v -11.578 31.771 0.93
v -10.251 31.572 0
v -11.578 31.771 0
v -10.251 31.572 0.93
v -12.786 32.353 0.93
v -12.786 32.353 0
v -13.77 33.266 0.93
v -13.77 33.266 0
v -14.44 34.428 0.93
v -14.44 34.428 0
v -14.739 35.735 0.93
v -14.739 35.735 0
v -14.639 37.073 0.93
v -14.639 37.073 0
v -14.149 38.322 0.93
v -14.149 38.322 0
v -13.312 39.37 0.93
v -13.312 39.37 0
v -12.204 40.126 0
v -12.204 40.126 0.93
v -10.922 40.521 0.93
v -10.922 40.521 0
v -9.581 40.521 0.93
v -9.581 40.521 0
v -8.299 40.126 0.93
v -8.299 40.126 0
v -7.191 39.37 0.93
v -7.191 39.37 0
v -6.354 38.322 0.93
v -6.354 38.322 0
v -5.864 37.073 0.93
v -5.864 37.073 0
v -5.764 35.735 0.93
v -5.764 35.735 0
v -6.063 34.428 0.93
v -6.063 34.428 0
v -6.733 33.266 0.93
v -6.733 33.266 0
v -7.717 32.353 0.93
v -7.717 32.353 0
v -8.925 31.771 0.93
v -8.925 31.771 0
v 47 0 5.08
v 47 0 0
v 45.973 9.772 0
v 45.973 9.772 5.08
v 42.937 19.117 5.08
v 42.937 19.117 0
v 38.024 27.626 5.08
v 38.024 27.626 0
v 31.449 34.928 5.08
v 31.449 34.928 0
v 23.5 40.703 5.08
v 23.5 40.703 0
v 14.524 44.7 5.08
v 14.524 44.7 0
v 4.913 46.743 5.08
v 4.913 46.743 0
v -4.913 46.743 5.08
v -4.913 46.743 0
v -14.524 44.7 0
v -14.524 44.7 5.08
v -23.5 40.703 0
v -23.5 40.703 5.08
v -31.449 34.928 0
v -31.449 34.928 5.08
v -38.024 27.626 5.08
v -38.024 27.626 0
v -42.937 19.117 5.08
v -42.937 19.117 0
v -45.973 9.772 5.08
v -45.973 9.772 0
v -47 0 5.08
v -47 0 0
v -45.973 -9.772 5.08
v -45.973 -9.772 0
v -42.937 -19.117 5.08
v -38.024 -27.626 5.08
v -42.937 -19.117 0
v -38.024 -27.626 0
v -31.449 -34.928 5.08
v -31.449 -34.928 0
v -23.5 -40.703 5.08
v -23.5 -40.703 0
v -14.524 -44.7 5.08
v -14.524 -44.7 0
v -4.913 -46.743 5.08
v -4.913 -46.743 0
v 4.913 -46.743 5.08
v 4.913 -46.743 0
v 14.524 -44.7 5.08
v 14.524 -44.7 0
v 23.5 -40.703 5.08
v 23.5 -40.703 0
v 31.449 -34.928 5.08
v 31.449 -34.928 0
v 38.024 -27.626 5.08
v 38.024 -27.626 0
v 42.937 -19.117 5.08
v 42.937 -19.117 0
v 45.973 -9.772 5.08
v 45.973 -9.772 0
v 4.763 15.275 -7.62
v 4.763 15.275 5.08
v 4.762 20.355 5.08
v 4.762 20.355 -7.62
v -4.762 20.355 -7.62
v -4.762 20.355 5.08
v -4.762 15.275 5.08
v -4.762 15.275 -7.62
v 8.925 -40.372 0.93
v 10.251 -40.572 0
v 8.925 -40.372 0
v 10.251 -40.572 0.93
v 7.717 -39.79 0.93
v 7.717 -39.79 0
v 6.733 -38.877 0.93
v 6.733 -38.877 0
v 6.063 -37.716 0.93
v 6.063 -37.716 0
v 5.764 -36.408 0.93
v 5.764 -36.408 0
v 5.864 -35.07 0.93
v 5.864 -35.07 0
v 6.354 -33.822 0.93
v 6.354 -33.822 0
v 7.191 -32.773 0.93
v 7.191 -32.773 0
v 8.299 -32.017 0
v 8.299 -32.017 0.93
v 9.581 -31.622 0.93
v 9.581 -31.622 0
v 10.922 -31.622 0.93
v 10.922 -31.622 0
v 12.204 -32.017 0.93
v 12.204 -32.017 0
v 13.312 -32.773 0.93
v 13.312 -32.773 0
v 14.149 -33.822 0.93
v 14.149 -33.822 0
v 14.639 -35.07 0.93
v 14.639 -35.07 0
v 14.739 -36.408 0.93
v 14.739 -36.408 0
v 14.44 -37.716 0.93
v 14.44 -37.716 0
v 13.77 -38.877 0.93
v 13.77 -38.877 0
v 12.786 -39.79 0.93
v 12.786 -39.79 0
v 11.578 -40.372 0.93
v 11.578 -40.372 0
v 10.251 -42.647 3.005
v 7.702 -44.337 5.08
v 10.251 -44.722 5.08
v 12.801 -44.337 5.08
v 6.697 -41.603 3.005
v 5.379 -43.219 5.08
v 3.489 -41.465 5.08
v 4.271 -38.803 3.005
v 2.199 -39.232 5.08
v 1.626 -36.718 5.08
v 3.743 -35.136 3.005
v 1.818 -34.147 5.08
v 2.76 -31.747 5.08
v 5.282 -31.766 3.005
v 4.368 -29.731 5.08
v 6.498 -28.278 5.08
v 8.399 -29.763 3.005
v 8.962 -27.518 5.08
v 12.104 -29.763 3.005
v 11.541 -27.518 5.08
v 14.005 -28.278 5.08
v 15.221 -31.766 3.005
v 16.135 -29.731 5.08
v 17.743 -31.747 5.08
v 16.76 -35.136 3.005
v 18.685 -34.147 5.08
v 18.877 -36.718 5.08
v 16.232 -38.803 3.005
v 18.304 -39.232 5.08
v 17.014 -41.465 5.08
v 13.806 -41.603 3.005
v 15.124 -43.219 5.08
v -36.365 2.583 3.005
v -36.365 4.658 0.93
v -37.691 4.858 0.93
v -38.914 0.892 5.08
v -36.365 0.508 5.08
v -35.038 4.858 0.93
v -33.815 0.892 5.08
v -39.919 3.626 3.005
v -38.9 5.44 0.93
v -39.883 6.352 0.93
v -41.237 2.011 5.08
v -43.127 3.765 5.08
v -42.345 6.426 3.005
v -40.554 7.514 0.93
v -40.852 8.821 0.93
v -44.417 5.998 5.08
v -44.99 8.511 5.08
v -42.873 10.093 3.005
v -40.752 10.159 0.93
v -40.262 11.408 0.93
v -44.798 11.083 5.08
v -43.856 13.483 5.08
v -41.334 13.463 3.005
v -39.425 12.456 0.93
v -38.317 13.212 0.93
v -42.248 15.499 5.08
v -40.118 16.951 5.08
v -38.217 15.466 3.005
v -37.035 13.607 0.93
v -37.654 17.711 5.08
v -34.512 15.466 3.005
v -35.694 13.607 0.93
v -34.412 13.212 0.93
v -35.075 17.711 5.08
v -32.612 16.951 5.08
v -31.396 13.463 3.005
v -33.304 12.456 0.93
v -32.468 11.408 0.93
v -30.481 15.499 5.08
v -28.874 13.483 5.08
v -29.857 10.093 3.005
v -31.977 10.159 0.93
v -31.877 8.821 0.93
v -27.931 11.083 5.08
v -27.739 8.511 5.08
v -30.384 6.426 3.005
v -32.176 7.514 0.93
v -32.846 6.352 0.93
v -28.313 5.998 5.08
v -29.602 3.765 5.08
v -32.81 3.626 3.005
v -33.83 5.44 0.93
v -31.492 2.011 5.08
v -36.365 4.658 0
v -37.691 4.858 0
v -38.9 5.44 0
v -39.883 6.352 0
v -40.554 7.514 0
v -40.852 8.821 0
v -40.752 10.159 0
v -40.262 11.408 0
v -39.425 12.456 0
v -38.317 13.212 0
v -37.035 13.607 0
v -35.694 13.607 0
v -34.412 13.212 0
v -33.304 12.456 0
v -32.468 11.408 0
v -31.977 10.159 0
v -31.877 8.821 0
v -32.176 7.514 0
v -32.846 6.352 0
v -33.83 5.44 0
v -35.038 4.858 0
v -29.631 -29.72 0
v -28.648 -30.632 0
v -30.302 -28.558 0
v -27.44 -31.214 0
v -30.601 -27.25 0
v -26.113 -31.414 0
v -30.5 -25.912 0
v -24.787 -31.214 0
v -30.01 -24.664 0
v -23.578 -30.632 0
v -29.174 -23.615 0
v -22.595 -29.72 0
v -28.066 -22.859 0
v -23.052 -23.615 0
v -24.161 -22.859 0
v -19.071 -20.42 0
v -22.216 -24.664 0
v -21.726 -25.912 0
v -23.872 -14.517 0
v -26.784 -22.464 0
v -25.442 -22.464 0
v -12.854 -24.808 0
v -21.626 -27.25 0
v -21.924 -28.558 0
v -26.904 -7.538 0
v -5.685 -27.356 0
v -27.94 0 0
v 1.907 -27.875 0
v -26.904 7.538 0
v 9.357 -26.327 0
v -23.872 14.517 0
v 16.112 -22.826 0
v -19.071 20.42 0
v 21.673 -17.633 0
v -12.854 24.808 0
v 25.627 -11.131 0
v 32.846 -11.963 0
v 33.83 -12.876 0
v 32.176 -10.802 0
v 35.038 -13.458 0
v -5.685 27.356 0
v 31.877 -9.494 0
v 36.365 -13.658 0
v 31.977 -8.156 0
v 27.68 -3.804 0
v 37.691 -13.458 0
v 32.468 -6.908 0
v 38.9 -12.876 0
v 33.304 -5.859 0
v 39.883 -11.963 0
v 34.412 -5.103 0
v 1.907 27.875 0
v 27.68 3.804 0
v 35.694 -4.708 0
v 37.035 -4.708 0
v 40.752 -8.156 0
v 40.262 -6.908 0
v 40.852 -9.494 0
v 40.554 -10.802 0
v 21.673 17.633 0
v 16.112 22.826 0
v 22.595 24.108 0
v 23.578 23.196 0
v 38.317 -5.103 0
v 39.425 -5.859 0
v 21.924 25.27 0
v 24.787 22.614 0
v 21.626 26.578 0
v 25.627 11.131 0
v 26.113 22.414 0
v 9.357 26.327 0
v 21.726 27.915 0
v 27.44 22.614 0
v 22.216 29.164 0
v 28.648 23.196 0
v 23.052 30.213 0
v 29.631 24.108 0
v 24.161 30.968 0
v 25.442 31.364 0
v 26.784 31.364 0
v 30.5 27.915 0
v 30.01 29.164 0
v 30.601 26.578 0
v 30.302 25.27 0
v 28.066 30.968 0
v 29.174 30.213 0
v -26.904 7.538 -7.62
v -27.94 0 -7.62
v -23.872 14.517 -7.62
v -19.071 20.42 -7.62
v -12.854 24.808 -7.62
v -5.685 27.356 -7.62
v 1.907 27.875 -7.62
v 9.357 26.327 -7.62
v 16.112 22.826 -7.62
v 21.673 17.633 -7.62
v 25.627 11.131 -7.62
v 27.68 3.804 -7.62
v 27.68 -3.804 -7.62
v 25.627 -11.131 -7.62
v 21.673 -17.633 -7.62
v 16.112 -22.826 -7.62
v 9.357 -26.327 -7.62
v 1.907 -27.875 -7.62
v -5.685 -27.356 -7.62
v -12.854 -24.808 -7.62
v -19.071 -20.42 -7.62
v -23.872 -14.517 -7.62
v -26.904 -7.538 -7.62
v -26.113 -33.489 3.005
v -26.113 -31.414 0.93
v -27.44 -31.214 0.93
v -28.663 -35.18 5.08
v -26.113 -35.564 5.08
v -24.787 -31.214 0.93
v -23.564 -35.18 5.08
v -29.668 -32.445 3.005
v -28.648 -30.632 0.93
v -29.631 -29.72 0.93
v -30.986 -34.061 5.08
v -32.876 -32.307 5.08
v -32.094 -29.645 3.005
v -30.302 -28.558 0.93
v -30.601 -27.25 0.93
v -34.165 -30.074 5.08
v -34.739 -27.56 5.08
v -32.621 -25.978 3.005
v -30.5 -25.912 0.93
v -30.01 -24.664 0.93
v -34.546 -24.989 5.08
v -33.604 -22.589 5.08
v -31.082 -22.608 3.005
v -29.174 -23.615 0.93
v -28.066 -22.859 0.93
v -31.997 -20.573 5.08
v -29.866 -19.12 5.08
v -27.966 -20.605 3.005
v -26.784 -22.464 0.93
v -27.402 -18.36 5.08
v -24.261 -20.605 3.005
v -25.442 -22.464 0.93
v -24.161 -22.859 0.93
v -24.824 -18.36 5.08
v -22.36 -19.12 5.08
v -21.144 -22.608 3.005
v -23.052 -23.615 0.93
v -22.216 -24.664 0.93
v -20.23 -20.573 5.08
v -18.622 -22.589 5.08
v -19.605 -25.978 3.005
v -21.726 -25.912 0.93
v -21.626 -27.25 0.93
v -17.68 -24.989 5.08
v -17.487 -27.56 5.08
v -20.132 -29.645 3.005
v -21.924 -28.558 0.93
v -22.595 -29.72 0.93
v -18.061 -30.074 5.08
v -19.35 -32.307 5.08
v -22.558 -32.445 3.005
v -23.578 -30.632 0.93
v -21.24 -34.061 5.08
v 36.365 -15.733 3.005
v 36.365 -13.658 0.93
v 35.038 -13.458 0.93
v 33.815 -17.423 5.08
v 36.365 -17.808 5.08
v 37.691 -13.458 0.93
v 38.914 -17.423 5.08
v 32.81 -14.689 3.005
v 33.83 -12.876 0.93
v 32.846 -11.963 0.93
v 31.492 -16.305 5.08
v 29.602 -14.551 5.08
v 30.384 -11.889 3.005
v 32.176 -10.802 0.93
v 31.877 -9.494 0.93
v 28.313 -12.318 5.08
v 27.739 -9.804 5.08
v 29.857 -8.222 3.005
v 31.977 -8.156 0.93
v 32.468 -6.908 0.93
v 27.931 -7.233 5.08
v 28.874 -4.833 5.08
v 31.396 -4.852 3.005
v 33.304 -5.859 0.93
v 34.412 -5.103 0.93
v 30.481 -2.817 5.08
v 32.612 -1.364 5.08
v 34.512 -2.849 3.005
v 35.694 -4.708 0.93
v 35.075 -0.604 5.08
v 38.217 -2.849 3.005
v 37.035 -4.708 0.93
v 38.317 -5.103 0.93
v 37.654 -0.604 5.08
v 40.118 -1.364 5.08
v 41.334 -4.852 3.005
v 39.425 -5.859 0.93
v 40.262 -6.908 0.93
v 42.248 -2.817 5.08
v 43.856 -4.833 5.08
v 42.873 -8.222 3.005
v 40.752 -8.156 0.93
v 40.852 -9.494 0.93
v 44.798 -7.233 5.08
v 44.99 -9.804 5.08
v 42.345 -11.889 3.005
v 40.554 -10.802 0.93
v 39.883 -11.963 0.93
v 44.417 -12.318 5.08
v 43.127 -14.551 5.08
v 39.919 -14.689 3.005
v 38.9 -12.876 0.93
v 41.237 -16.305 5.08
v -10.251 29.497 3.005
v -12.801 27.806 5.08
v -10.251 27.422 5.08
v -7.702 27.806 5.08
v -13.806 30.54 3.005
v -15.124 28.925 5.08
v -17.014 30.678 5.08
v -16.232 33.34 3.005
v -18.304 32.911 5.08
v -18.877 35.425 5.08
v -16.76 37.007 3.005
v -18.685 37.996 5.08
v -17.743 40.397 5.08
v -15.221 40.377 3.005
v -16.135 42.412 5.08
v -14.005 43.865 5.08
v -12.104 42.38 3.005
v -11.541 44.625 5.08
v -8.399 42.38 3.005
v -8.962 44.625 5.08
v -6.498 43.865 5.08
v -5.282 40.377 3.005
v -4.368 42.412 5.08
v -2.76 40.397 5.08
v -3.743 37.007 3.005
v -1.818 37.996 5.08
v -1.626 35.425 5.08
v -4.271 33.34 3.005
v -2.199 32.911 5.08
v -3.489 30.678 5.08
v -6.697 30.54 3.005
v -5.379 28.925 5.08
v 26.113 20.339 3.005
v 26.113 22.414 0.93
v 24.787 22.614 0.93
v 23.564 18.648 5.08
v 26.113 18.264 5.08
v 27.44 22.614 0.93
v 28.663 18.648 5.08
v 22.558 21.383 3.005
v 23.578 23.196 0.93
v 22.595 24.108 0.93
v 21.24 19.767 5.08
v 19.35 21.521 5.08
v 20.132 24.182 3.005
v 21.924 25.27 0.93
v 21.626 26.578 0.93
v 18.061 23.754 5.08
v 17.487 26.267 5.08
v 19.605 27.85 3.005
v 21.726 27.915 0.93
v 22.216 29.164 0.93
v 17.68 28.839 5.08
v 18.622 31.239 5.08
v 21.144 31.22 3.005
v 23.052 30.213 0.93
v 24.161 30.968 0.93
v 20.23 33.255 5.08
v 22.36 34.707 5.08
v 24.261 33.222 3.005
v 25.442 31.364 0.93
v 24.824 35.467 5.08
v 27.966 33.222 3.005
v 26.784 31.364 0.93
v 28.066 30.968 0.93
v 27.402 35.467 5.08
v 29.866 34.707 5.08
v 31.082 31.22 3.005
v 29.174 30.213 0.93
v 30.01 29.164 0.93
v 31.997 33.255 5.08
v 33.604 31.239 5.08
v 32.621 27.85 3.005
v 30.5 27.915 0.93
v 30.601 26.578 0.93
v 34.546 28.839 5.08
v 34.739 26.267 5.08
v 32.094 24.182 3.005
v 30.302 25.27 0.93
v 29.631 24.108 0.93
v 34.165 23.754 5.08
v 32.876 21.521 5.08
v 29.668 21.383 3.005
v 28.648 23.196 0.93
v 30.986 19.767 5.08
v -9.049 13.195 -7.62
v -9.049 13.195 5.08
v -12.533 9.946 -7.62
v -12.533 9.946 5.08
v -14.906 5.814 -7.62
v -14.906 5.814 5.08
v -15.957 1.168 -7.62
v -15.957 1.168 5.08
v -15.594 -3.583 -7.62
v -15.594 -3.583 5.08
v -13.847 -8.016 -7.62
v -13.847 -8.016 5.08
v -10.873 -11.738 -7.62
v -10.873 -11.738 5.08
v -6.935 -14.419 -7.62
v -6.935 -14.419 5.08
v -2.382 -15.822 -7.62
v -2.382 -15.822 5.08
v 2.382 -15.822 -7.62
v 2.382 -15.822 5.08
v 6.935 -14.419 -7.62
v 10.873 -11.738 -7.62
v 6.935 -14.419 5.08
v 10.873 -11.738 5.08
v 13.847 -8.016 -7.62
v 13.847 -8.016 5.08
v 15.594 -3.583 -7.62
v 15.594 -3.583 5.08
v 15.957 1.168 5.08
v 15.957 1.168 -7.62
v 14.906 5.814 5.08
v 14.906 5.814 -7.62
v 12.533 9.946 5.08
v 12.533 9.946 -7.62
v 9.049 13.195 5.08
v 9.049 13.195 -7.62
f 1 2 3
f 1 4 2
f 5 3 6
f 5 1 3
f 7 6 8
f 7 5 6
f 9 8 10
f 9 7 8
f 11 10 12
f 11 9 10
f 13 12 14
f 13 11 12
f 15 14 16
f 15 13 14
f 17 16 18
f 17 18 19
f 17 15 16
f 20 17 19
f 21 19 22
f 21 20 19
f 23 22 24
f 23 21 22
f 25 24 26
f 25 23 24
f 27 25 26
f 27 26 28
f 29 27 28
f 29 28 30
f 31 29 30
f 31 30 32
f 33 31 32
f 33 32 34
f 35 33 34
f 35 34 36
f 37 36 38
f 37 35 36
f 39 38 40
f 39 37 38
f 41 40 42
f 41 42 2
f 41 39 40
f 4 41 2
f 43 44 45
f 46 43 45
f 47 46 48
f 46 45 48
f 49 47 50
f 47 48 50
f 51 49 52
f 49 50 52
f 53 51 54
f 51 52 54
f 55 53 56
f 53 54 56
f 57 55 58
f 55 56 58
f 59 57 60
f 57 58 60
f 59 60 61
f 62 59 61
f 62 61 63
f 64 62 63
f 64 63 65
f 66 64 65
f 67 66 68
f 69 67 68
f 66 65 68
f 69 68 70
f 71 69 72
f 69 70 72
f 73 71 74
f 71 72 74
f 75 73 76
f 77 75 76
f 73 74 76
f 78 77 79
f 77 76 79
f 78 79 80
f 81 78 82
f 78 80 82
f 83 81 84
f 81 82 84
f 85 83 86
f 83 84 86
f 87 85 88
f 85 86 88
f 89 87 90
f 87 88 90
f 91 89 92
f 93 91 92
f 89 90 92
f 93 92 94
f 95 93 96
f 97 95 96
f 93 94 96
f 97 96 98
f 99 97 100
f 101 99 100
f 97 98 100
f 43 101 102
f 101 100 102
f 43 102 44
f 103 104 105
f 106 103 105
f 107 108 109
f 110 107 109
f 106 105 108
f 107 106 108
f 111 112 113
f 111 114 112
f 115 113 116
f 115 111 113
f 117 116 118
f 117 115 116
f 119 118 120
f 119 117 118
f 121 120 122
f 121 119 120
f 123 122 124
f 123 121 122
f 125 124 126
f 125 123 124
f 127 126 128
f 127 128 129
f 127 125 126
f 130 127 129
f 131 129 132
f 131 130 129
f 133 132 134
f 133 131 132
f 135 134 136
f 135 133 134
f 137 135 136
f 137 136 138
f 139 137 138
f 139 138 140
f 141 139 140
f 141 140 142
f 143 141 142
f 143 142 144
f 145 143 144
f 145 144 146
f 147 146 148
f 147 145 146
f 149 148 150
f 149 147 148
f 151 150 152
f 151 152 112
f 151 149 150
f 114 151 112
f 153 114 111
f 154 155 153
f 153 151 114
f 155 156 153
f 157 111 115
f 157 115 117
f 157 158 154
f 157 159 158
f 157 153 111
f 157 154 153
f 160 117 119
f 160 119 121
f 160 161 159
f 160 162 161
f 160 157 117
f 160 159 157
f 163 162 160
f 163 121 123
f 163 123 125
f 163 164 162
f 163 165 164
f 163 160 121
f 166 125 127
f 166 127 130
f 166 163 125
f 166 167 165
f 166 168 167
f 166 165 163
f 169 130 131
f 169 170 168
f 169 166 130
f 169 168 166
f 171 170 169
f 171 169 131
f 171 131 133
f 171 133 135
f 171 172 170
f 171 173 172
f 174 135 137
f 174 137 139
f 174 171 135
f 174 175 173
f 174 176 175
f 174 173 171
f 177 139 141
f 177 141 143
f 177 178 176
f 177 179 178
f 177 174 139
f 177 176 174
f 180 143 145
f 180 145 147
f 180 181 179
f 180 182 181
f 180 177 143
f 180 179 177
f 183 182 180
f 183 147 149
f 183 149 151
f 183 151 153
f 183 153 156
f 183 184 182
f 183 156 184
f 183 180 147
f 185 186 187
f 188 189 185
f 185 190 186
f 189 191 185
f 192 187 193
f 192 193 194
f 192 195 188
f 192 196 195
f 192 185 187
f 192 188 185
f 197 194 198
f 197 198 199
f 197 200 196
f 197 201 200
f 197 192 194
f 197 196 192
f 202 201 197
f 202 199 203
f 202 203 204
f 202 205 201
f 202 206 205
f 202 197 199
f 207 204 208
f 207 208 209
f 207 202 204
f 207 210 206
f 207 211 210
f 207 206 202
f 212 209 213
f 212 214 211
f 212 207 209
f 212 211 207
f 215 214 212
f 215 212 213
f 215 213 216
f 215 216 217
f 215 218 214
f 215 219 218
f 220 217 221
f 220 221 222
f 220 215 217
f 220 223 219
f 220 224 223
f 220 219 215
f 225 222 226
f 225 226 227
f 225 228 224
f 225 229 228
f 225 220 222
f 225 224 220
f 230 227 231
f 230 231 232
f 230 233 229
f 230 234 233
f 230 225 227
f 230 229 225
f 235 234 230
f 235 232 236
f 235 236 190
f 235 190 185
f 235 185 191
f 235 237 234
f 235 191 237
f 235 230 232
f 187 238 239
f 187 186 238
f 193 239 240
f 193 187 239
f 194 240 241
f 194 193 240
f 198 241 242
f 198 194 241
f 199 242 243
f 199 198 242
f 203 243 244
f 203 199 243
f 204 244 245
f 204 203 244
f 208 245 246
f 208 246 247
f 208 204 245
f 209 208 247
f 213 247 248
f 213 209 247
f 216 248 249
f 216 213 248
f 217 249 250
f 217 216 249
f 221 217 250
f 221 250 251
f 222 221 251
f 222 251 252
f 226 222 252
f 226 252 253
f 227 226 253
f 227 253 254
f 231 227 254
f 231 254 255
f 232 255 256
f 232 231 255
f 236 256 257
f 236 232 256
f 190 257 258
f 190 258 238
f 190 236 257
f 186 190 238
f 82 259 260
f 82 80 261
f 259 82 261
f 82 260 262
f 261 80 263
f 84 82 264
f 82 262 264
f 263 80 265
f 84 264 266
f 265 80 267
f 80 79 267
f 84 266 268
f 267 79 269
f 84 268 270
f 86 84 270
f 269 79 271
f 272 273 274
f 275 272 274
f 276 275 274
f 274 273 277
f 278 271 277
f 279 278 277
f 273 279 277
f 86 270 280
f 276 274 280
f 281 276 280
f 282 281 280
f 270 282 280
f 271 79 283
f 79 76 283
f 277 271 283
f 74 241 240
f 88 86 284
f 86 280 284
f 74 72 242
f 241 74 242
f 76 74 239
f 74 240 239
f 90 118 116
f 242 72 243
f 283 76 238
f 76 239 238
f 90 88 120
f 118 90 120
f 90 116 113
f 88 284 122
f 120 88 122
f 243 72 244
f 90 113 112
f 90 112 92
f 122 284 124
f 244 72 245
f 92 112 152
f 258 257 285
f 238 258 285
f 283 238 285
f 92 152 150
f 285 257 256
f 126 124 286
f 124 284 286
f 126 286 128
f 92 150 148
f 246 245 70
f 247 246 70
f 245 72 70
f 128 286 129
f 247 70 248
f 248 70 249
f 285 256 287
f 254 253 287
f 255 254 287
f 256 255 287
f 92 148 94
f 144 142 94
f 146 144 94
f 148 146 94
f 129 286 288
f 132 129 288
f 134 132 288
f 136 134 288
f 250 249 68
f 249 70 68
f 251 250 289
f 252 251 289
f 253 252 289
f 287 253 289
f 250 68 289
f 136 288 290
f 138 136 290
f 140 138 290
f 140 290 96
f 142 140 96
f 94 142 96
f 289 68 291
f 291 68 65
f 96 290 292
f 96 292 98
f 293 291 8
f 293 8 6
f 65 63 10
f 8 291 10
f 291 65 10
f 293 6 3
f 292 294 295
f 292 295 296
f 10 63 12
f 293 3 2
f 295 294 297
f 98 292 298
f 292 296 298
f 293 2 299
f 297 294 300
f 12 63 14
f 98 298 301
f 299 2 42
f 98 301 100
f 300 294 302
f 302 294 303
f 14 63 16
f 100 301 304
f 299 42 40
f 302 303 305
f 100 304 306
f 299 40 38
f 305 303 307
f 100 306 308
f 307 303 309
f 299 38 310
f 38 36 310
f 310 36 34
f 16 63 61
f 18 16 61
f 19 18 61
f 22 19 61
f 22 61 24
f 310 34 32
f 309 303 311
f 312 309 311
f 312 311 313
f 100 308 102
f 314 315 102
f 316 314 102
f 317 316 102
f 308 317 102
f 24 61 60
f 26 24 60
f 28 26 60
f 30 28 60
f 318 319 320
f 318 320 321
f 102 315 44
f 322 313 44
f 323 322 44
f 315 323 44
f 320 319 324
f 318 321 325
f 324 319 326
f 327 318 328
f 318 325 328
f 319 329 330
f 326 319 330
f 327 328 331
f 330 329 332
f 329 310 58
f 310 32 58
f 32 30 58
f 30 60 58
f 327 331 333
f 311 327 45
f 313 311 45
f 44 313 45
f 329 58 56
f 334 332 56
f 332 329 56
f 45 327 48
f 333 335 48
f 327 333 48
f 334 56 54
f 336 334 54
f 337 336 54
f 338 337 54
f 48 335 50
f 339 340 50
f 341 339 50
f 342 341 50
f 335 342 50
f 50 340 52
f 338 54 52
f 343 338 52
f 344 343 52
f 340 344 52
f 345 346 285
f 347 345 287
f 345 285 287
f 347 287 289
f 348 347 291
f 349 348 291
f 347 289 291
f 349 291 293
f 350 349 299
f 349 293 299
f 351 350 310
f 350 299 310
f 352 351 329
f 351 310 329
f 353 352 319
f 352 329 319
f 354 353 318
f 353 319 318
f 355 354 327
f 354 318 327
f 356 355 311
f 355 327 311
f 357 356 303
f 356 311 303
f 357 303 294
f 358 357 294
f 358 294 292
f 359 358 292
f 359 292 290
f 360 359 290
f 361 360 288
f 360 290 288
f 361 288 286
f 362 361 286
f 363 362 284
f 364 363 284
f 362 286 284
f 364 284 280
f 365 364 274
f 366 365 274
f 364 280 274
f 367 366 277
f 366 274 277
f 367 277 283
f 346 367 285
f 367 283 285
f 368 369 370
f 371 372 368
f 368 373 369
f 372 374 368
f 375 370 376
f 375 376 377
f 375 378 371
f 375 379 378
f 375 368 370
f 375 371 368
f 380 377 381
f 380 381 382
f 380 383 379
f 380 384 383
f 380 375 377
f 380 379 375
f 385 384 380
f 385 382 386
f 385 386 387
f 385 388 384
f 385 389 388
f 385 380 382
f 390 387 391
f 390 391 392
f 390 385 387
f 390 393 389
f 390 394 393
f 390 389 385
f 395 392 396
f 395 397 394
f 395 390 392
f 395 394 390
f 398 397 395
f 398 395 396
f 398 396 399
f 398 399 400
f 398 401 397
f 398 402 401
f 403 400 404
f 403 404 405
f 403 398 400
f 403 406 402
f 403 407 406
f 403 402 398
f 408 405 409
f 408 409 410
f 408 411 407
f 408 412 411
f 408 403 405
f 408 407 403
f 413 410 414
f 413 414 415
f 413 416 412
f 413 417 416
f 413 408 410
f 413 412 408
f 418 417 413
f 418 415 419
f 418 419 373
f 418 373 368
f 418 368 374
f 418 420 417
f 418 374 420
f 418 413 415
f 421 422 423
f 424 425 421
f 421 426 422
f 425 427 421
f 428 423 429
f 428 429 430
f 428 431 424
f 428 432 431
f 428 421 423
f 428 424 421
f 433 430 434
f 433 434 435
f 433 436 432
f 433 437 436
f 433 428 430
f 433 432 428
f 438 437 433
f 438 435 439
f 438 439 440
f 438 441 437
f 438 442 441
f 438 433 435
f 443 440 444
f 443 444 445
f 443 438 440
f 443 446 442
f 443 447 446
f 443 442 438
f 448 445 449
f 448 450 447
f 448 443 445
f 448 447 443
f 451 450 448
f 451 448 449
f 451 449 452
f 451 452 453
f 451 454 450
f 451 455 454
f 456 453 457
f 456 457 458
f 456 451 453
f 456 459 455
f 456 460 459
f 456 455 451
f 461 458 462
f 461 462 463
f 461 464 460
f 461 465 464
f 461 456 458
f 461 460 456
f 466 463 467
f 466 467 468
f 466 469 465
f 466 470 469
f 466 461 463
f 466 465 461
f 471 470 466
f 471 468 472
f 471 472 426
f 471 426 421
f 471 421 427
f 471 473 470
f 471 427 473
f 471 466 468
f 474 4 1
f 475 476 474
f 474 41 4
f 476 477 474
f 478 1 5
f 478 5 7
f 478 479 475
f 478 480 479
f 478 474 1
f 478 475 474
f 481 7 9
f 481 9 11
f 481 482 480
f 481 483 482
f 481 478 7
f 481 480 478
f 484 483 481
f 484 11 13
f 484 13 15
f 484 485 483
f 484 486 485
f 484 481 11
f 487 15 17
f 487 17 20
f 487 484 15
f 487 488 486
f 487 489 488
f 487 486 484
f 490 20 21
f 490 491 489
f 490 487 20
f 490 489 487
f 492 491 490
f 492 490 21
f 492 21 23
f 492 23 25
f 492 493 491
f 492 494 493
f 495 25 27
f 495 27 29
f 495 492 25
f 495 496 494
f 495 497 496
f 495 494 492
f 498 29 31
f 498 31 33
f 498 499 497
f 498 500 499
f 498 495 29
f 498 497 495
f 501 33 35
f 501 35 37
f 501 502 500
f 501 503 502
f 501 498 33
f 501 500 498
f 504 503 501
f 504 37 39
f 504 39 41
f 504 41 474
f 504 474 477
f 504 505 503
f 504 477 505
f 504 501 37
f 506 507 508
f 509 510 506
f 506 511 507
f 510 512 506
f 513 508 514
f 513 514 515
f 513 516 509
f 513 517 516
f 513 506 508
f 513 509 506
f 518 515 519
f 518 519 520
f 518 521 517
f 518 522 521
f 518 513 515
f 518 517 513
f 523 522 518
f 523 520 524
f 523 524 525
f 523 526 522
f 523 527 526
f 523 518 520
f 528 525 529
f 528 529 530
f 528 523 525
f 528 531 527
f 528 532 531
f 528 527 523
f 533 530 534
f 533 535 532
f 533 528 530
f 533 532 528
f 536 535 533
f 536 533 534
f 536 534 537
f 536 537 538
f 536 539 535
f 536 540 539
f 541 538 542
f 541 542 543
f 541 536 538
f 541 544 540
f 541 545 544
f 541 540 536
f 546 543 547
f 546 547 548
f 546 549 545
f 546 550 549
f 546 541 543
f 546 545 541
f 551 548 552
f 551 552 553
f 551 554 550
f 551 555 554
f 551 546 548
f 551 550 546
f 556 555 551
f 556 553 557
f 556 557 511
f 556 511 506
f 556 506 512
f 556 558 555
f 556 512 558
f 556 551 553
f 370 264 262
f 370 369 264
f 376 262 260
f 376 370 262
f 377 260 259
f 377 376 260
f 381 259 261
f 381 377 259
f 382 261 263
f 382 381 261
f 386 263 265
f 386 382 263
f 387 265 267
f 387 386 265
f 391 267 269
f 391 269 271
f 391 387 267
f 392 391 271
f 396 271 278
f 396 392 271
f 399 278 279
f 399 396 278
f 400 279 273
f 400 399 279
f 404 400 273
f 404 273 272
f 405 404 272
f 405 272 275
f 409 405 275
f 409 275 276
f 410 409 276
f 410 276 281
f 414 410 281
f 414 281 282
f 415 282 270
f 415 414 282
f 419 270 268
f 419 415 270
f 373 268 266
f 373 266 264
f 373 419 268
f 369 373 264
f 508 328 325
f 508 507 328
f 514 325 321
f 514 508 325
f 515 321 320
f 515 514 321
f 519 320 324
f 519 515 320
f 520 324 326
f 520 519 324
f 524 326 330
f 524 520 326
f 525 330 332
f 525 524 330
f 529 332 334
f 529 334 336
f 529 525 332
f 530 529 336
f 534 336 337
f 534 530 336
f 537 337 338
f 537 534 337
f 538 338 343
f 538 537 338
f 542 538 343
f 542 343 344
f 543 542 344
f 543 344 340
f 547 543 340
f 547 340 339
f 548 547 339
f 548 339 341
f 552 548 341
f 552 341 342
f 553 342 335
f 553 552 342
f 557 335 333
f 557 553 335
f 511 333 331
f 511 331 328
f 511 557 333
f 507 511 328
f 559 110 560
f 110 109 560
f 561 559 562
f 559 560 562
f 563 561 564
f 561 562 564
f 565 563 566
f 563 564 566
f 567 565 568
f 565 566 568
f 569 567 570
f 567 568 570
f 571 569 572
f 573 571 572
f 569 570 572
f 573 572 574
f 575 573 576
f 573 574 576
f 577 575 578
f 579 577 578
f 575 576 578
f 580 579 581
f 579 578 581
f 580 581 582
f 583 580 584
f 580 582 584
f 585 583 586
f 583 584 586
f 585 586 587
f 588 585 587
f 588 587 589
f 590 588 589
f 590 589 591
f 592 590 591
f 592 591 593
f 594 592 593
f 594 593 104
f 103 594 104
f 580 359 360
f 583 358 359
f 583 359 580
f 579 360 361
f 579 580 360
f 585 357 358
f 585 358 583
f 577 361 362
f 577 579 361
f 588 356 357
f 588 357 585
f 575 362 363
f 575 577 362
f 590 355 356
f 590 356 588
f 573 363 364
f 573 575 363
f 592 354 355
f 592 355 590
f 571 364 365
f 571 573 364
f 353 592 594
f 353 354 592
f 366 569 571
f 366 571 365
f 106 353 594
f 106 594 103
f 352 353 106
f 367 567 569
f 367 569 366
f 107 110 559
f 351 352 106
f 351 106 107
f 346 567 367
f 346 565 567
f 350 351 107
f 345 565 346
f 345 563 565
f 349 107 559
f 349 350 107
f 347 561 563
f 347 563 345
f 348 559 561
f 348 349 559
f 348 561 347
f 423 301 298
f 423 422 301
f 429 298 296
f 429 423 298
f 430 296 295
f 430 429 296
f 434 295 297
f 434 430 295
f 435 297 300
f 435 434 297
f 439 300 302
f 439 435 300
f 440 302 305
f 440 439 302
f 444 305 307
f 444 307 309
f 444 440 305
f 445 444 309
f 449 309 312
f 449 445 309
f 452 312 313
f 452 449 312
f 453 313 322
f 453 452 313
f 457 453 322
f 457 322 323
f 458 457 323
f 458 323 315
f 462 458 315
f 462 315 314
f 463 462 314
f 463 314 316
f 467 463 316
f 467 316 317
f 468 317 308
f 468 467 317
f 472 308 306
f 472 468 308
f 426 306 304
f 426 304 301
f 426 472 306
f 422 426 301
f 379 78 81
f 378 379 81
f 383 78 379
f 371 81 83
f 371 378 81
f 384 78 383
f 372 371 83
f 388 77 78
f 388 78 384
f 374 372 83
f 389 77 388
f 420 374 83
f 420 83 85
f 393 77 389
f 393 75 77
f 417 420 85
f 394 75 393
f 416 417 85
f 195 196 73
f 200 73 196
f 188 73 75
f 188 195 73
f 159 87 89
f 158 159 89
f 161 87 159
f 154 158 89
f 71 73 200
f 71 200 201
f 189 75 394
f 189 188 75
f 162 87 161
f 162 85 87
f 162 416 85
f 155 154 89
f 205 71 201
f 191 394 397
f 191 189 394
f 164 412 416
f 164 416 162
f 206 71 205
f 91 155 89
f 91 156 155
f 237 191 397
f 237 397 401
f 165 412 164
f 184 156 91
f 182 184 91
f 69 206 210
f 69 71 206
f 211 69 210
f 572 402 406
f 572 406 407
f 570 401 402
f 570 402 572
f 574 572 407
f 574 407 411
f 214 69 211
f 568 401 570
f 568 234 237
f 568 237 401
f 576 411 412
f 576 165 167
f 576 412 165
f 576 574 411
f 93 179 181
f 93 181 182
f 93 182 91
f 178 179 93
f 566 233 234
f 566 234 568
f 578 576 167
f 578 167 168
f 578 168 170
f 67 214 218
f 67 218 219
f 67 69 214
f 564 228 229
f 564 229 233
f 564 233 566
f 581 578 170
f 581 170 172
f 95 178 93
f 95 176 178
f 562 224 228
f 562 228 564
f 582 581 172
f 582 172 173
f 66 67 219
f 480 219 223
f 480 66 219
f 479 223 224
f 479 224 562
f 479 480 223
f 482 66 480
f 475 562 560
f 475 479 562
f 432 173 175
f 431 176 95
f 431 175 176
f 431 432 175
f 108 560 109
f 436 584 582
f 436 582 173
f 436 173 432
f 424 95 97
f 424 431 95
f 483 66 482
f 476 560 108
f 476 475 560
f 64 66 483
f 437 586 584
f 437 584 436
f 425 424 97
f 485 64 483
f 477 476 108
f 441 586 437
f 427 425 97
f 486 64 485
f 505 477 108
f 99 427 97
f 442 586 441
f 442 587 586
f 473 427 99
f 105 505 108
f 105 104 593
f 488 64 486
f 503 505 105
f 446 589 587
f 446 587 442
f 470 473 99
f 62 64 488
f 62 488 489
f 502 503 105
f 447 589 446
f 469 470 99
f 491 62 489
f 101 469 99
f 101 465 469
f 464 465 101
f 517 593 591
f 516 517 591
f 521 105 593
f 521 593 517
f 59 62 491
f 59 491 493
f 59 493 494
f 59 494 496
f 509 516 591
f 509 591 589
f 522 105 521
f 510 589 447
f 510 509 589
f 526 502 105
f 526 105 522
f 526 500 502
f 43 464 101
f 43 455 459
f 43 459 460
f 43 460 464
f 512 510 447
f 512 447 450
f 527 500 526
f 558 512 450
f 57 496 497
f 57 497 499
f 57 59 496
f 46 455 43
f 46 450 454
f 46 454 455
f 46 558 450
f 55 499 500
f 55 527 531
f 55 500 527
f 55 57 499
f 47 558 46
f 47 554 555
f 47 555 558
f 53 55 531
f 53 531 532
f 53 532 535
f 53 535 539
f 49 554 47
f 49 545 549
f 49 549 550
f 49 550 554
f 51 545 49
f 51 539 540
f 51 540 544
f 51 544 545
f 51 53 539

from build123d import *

# Parameters (mm, degrees)
SKETCH1_R                                      = 47
BOSS_EXTRUDE1_DEPTH                            = 5.08
CSK_FOR_M8_FLAT_HEAD_MACHINE_SCREW1_AT_2_COUNT = 2
CSK_FOR_M8_FLAT_HEAD_MACHINE_SCREW1_AT_2_PITCH = 37.5
CSK_FOR_M8_FLAT_HEAD_MACHINE_SCREW1_AT_3_COUNT = 2
CSK_FOR_M8_FLAT_HEAD_MACHINE_SCREW1_AT_3_PITCH = 37.5
CSK_FOR_M8_FLAT_HEAD_MACHINE_SCREW1_AT_4_COUNT = 2
CSK_FOR_M8_FLAT_HEAD_MACHINE_SCREW1_AT_4_PITCH = 64.951905284
CSK_FOR_M8_FLAT_HEAD_MACHINE_SCREW1_AT_5_COUNT = 2
CSK_FOR_M8_FLAT_HEAD_MACHINE_SCREW1_AT_5_PITCH = 75
CSK_FOR_M8_FLAT_HEAD_MACHINE_SCREW1_AT_6_COUNT = 2
CSK_FOR_M8_FLAT_HEAD_MACHINE_SCREW1_AT_6_PITCH = 64.951905284
SKETCH11_R                                     = 27.94
BOSS_EXTRUDE2_DEPTH                            = 7.62


with BuildPart() as part:
    # Sketch1 → Boss-Extrude1 (new body)
    with BuildSketch(Plane.XY):
        Circle(SKETCH1_R)
        with BuildLine():
            Line((-4.7625, 20.354769843), (-4.7625, 15.274769843))
            ThreePointArc((-4.7625, 15.274769843), (0, -16), (4.7625, 15.274769843))
            Line((4.7625, 15.274769843), (4.7625, 20.354769843))
            Line((4.7625, 20.354769843), (-4.7625, 20.354769843))
        make_face(mode=Mode.SUBTRACT)
    extrude(amount=BOSS_EXTRUDE1_DEPTH)

    # Sketch10 → CSK for M8 Flat Head Machine Screw1 (revolve, cut)
    with BuildSketch(Plane(origin=(-10.251484687, 36.071554745, 5.08), x_dir=(0, -1, 0), z_dir=(1, 0, 0))):
        Polygon((0, 0), (0, 5.08), (4.5, 5.08), (4.5, 4.15), (8.65, 0), align=None)
    csk_for_m8_flat_head_machine_screw1 = revolve(axis=Axis((-10.251484687, 36.071554745, 11.43), (0, 0, -1)), mode=Mode.SUBTRACT)

    # CSK for M8 Flat Head Machine Screw1 at 2: CSK for M8 Flat Head Machine Screw1 ×2
    with Locations(*[Vector(0.969723336, -0.244206166, 0) * (i * CSK_FOR_M8_FLAT_HEAD_MACHINE_SCREW1_AT_2_PITCH) for i in range(1, CSK_FOR_M8_FLAT_HEAD_MACHINE_SCREW1_AT_2_COUNT)]):
        add(csk_for_m8_flat_head_machine_screw1, mode=Mode.SUBTRACT)

    # CSK for M8 Flat Head Machine Screw1 at 3: CSK for M8 Flat Head Machine Screw1 ×2
    with Locations(*[Vector(-0.696350411, -0.717701961, 0) * (i * CSK_FOR_M8_FLAT_HEAD_MACHINE_SCREW1_AT_3_PITCH) for i in range(1, CSK_FOR_M8_FLAT_HEAD_MACHINE_SCREW1_AT_3_COUNT)]):
        add(csk_for_m8_flat_head_machine_screw1, mode=Mode.SUBTRACT)

    # CSK for M8 Flat Head Machine Screw1 at 4: CSK for M8 Flat Head Machine Screw1 ×2
    with Locations(*[Vector(0.717701961, -0.696350411, 0) * (i * CSK_FOR_M8_FLAT_HEAD_MACHINE_SCREW1_AT_4_PITCH) for i in range(1, CSK_FOR_M8_FLAT_HEAD_MACHINE_SCREW1_AT_4_COUNT)]):
        add(csk_for_m8_flat_head_machine_screw1, mode=Mode.SUBTRACT)

    # CSK for M8 Flat Head Machine Screw1 at 5: CSK for M8 Flat Head Machine Screw1 ×2
    with Locations(*[Vector(0.273372925, -0.961908127, 0) * (i * CSK_FOR_M8_FLAT_HEAD_MACHINE_SCREW1_AT_5_PITCH) for i in range(1, CSK_FOR_M8_FLAT_HEAD_MACHINE_SCREW1_AT_5_COUNT)]):
        add(csk_for_m8_flat_head_machine_screw1, mode=Mode.SUBTRACT)

    # CSK for M8 Flat Head Machine Screw1 at 6: CSK for M8 Flat Head Machine Screw1 ×2
    with Locations(*[Vector(-0.244206166, -0.969723336, 0) * (i * CSK_FOR_M8_FLAT_HEAD_MACHINE_SCREW1_AT_6_PITCH) for i in range(1, CSK_FOR_M8_FLAT_HEAD_MACHINE_SCREW1_AT_6_COUNT)]):
        add(csk_for_m8_flat_head_machine_screw1, mode=Mode.SUBTRACT)

    # Sketch11 → Boss-Extrude2 (add)
    with BuildSketch(Plane(origin=(0, 0, 0), x_dir=(-1, 0, 0), z_dir=(0, 0, -1))):
        Circle(SKETCH11_R)
        with BuildLine():
            ThreePointArc((4.7625, 15.274769843), (0, -16), (-4.7625, 15.274769843))
            Line((-4.7625, 15.274769843), (-4.7625, 20.354769843))
            Line((-4.7625, 20.354769843), (4.7625, 20.354769843))
            Line((4.7625, 20.354769843), (4.7625, 15.274769843))
        make_face(mode=Mode.SUBTRACT)
    extrude(amount=BOSS_EXTRUDE2_DEPTH)


solid = part.part
